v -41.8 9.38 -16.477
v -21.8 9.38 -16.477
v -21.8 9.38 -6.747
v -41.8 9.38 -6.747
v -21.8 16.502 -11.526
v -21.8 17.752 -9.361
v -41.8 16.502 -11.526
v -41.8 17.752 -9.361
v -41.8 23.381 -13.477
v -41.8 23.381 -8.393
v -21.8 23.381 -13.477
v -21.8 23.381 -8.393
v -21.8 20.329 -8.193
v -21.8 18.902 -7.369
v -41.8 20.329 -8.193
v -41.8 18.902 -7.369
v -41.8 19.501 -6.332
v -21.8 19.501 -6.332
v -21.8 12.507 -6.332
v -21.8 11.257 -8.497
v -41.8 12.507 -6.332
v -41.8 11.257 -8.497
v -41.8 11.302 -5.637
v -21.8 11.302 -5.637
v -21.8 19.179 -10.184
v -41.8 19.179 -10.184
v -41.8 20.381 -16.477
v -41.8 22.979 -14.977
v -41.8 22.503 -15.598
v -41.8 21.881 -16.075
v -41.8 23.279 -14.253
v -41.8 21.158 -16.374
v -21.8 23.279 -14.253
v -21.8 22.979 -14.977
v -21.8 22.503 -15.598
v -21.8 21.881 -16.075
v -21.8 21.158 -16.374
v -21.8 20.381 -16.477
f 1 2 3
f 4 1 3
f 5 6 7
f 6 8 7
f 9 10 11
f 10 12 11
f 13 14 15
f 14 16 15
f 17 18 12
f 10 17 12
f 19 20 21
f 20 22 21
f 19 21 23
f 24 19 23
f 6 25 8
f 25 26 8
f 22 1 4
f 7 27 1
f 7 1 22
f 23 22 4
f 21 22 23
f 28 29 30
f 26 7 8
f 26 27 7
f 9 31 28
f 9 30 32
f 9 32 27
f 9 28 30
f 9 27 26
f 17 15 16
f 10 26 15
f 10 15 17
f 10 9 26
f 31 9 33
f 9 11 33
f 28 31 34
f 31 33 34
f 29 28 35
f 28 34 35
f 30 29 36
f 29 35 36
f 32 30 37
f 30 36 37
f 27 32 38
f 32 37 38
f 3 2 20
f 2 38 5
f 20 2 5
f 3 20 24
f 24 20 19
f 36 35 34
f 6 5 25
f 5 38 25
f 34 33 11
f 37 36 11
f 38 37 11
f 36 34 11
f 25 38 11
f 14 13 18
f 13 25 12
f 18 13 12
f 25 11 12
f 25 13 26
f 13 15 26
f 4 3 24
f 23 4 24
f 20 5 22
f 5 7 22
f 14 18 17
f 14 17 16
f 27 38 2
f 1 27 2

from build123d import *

# Parameters (mm, degrees)
BOSS_EXTRUDE1_DEPTH      = 10
BOSS_EXTRUDE1_DEPTH_BACK = 10
CUT_EXTRUDE1_DEPTH       = 10
CUT_EXTRUDE1_DEPTH_BACK  = 10


with BuildPart() as part:
    # Sketch13 → Boss-Extrude1 (new, two sides: drawn at the far end of the back side and taken through both)
    with BuildSketch(Plane(origin=(-31.8, 0, 0), x_dir=(0, 0, -1), z_dir=(1, 0, 0)).offset(-BOSS_EXTRUDE1_DEPTH_BACK)):
        with BuildLine():
            Line((6.746523488, 9.38), (3.731523488, 14.602133185))
            Line((3.731523488, 14.602133185), (8.392906101, 23.38137644))
            Line((8.392906101, 23.38137644), (13.476604558, 23.38137644))
            ThreePointArc((13.476604558, 23.38137644), (15.597924901, 22.502696784), (16.476604558, 20.38137644))
            Line((16.476604558, 20.38137644), (16.476604558, 9.38))
            Line((16.476604558, 9.38), (6.746523488, 9.38))
        make_face()
    extrude(amount=BOSS_EXTRUDE1_DEPTH + BOSS_EXTRUDE1_DEPTH_BACK)

    # Sketch15 → Cut-Extrude1 (cut, two sides: drawn at the far end of the back side and taken through both)
    with BuildSketch(Plane(origin=(-31.8, 0, 0), x_dir=(0, 0, -1), z_dir=(1, 0, 0)).offset(-CUT_EXTRUDE1_DEPTH_BACK)):
        Polygon((10.184407321, 19.178855838), (9.360685737, 17.752128204), (11.525749246, 16.502128204), (8.497418172, 11.256904921), (6.332354663, 12.506904921), (5.636779377, 11.302133185), (3.617891994, 14.798948707), (6.332354663, 19.500535964), (7.368827308, 18.902128204), (8.192548892, 20.328855838), align=None)
    extrude(amount=CUT_EXTRUDE1_DEPTH + CUT_EXTRUDE1_DEPTH_BACK, mode=Mode.SUBTRACT)


solid = part.part
